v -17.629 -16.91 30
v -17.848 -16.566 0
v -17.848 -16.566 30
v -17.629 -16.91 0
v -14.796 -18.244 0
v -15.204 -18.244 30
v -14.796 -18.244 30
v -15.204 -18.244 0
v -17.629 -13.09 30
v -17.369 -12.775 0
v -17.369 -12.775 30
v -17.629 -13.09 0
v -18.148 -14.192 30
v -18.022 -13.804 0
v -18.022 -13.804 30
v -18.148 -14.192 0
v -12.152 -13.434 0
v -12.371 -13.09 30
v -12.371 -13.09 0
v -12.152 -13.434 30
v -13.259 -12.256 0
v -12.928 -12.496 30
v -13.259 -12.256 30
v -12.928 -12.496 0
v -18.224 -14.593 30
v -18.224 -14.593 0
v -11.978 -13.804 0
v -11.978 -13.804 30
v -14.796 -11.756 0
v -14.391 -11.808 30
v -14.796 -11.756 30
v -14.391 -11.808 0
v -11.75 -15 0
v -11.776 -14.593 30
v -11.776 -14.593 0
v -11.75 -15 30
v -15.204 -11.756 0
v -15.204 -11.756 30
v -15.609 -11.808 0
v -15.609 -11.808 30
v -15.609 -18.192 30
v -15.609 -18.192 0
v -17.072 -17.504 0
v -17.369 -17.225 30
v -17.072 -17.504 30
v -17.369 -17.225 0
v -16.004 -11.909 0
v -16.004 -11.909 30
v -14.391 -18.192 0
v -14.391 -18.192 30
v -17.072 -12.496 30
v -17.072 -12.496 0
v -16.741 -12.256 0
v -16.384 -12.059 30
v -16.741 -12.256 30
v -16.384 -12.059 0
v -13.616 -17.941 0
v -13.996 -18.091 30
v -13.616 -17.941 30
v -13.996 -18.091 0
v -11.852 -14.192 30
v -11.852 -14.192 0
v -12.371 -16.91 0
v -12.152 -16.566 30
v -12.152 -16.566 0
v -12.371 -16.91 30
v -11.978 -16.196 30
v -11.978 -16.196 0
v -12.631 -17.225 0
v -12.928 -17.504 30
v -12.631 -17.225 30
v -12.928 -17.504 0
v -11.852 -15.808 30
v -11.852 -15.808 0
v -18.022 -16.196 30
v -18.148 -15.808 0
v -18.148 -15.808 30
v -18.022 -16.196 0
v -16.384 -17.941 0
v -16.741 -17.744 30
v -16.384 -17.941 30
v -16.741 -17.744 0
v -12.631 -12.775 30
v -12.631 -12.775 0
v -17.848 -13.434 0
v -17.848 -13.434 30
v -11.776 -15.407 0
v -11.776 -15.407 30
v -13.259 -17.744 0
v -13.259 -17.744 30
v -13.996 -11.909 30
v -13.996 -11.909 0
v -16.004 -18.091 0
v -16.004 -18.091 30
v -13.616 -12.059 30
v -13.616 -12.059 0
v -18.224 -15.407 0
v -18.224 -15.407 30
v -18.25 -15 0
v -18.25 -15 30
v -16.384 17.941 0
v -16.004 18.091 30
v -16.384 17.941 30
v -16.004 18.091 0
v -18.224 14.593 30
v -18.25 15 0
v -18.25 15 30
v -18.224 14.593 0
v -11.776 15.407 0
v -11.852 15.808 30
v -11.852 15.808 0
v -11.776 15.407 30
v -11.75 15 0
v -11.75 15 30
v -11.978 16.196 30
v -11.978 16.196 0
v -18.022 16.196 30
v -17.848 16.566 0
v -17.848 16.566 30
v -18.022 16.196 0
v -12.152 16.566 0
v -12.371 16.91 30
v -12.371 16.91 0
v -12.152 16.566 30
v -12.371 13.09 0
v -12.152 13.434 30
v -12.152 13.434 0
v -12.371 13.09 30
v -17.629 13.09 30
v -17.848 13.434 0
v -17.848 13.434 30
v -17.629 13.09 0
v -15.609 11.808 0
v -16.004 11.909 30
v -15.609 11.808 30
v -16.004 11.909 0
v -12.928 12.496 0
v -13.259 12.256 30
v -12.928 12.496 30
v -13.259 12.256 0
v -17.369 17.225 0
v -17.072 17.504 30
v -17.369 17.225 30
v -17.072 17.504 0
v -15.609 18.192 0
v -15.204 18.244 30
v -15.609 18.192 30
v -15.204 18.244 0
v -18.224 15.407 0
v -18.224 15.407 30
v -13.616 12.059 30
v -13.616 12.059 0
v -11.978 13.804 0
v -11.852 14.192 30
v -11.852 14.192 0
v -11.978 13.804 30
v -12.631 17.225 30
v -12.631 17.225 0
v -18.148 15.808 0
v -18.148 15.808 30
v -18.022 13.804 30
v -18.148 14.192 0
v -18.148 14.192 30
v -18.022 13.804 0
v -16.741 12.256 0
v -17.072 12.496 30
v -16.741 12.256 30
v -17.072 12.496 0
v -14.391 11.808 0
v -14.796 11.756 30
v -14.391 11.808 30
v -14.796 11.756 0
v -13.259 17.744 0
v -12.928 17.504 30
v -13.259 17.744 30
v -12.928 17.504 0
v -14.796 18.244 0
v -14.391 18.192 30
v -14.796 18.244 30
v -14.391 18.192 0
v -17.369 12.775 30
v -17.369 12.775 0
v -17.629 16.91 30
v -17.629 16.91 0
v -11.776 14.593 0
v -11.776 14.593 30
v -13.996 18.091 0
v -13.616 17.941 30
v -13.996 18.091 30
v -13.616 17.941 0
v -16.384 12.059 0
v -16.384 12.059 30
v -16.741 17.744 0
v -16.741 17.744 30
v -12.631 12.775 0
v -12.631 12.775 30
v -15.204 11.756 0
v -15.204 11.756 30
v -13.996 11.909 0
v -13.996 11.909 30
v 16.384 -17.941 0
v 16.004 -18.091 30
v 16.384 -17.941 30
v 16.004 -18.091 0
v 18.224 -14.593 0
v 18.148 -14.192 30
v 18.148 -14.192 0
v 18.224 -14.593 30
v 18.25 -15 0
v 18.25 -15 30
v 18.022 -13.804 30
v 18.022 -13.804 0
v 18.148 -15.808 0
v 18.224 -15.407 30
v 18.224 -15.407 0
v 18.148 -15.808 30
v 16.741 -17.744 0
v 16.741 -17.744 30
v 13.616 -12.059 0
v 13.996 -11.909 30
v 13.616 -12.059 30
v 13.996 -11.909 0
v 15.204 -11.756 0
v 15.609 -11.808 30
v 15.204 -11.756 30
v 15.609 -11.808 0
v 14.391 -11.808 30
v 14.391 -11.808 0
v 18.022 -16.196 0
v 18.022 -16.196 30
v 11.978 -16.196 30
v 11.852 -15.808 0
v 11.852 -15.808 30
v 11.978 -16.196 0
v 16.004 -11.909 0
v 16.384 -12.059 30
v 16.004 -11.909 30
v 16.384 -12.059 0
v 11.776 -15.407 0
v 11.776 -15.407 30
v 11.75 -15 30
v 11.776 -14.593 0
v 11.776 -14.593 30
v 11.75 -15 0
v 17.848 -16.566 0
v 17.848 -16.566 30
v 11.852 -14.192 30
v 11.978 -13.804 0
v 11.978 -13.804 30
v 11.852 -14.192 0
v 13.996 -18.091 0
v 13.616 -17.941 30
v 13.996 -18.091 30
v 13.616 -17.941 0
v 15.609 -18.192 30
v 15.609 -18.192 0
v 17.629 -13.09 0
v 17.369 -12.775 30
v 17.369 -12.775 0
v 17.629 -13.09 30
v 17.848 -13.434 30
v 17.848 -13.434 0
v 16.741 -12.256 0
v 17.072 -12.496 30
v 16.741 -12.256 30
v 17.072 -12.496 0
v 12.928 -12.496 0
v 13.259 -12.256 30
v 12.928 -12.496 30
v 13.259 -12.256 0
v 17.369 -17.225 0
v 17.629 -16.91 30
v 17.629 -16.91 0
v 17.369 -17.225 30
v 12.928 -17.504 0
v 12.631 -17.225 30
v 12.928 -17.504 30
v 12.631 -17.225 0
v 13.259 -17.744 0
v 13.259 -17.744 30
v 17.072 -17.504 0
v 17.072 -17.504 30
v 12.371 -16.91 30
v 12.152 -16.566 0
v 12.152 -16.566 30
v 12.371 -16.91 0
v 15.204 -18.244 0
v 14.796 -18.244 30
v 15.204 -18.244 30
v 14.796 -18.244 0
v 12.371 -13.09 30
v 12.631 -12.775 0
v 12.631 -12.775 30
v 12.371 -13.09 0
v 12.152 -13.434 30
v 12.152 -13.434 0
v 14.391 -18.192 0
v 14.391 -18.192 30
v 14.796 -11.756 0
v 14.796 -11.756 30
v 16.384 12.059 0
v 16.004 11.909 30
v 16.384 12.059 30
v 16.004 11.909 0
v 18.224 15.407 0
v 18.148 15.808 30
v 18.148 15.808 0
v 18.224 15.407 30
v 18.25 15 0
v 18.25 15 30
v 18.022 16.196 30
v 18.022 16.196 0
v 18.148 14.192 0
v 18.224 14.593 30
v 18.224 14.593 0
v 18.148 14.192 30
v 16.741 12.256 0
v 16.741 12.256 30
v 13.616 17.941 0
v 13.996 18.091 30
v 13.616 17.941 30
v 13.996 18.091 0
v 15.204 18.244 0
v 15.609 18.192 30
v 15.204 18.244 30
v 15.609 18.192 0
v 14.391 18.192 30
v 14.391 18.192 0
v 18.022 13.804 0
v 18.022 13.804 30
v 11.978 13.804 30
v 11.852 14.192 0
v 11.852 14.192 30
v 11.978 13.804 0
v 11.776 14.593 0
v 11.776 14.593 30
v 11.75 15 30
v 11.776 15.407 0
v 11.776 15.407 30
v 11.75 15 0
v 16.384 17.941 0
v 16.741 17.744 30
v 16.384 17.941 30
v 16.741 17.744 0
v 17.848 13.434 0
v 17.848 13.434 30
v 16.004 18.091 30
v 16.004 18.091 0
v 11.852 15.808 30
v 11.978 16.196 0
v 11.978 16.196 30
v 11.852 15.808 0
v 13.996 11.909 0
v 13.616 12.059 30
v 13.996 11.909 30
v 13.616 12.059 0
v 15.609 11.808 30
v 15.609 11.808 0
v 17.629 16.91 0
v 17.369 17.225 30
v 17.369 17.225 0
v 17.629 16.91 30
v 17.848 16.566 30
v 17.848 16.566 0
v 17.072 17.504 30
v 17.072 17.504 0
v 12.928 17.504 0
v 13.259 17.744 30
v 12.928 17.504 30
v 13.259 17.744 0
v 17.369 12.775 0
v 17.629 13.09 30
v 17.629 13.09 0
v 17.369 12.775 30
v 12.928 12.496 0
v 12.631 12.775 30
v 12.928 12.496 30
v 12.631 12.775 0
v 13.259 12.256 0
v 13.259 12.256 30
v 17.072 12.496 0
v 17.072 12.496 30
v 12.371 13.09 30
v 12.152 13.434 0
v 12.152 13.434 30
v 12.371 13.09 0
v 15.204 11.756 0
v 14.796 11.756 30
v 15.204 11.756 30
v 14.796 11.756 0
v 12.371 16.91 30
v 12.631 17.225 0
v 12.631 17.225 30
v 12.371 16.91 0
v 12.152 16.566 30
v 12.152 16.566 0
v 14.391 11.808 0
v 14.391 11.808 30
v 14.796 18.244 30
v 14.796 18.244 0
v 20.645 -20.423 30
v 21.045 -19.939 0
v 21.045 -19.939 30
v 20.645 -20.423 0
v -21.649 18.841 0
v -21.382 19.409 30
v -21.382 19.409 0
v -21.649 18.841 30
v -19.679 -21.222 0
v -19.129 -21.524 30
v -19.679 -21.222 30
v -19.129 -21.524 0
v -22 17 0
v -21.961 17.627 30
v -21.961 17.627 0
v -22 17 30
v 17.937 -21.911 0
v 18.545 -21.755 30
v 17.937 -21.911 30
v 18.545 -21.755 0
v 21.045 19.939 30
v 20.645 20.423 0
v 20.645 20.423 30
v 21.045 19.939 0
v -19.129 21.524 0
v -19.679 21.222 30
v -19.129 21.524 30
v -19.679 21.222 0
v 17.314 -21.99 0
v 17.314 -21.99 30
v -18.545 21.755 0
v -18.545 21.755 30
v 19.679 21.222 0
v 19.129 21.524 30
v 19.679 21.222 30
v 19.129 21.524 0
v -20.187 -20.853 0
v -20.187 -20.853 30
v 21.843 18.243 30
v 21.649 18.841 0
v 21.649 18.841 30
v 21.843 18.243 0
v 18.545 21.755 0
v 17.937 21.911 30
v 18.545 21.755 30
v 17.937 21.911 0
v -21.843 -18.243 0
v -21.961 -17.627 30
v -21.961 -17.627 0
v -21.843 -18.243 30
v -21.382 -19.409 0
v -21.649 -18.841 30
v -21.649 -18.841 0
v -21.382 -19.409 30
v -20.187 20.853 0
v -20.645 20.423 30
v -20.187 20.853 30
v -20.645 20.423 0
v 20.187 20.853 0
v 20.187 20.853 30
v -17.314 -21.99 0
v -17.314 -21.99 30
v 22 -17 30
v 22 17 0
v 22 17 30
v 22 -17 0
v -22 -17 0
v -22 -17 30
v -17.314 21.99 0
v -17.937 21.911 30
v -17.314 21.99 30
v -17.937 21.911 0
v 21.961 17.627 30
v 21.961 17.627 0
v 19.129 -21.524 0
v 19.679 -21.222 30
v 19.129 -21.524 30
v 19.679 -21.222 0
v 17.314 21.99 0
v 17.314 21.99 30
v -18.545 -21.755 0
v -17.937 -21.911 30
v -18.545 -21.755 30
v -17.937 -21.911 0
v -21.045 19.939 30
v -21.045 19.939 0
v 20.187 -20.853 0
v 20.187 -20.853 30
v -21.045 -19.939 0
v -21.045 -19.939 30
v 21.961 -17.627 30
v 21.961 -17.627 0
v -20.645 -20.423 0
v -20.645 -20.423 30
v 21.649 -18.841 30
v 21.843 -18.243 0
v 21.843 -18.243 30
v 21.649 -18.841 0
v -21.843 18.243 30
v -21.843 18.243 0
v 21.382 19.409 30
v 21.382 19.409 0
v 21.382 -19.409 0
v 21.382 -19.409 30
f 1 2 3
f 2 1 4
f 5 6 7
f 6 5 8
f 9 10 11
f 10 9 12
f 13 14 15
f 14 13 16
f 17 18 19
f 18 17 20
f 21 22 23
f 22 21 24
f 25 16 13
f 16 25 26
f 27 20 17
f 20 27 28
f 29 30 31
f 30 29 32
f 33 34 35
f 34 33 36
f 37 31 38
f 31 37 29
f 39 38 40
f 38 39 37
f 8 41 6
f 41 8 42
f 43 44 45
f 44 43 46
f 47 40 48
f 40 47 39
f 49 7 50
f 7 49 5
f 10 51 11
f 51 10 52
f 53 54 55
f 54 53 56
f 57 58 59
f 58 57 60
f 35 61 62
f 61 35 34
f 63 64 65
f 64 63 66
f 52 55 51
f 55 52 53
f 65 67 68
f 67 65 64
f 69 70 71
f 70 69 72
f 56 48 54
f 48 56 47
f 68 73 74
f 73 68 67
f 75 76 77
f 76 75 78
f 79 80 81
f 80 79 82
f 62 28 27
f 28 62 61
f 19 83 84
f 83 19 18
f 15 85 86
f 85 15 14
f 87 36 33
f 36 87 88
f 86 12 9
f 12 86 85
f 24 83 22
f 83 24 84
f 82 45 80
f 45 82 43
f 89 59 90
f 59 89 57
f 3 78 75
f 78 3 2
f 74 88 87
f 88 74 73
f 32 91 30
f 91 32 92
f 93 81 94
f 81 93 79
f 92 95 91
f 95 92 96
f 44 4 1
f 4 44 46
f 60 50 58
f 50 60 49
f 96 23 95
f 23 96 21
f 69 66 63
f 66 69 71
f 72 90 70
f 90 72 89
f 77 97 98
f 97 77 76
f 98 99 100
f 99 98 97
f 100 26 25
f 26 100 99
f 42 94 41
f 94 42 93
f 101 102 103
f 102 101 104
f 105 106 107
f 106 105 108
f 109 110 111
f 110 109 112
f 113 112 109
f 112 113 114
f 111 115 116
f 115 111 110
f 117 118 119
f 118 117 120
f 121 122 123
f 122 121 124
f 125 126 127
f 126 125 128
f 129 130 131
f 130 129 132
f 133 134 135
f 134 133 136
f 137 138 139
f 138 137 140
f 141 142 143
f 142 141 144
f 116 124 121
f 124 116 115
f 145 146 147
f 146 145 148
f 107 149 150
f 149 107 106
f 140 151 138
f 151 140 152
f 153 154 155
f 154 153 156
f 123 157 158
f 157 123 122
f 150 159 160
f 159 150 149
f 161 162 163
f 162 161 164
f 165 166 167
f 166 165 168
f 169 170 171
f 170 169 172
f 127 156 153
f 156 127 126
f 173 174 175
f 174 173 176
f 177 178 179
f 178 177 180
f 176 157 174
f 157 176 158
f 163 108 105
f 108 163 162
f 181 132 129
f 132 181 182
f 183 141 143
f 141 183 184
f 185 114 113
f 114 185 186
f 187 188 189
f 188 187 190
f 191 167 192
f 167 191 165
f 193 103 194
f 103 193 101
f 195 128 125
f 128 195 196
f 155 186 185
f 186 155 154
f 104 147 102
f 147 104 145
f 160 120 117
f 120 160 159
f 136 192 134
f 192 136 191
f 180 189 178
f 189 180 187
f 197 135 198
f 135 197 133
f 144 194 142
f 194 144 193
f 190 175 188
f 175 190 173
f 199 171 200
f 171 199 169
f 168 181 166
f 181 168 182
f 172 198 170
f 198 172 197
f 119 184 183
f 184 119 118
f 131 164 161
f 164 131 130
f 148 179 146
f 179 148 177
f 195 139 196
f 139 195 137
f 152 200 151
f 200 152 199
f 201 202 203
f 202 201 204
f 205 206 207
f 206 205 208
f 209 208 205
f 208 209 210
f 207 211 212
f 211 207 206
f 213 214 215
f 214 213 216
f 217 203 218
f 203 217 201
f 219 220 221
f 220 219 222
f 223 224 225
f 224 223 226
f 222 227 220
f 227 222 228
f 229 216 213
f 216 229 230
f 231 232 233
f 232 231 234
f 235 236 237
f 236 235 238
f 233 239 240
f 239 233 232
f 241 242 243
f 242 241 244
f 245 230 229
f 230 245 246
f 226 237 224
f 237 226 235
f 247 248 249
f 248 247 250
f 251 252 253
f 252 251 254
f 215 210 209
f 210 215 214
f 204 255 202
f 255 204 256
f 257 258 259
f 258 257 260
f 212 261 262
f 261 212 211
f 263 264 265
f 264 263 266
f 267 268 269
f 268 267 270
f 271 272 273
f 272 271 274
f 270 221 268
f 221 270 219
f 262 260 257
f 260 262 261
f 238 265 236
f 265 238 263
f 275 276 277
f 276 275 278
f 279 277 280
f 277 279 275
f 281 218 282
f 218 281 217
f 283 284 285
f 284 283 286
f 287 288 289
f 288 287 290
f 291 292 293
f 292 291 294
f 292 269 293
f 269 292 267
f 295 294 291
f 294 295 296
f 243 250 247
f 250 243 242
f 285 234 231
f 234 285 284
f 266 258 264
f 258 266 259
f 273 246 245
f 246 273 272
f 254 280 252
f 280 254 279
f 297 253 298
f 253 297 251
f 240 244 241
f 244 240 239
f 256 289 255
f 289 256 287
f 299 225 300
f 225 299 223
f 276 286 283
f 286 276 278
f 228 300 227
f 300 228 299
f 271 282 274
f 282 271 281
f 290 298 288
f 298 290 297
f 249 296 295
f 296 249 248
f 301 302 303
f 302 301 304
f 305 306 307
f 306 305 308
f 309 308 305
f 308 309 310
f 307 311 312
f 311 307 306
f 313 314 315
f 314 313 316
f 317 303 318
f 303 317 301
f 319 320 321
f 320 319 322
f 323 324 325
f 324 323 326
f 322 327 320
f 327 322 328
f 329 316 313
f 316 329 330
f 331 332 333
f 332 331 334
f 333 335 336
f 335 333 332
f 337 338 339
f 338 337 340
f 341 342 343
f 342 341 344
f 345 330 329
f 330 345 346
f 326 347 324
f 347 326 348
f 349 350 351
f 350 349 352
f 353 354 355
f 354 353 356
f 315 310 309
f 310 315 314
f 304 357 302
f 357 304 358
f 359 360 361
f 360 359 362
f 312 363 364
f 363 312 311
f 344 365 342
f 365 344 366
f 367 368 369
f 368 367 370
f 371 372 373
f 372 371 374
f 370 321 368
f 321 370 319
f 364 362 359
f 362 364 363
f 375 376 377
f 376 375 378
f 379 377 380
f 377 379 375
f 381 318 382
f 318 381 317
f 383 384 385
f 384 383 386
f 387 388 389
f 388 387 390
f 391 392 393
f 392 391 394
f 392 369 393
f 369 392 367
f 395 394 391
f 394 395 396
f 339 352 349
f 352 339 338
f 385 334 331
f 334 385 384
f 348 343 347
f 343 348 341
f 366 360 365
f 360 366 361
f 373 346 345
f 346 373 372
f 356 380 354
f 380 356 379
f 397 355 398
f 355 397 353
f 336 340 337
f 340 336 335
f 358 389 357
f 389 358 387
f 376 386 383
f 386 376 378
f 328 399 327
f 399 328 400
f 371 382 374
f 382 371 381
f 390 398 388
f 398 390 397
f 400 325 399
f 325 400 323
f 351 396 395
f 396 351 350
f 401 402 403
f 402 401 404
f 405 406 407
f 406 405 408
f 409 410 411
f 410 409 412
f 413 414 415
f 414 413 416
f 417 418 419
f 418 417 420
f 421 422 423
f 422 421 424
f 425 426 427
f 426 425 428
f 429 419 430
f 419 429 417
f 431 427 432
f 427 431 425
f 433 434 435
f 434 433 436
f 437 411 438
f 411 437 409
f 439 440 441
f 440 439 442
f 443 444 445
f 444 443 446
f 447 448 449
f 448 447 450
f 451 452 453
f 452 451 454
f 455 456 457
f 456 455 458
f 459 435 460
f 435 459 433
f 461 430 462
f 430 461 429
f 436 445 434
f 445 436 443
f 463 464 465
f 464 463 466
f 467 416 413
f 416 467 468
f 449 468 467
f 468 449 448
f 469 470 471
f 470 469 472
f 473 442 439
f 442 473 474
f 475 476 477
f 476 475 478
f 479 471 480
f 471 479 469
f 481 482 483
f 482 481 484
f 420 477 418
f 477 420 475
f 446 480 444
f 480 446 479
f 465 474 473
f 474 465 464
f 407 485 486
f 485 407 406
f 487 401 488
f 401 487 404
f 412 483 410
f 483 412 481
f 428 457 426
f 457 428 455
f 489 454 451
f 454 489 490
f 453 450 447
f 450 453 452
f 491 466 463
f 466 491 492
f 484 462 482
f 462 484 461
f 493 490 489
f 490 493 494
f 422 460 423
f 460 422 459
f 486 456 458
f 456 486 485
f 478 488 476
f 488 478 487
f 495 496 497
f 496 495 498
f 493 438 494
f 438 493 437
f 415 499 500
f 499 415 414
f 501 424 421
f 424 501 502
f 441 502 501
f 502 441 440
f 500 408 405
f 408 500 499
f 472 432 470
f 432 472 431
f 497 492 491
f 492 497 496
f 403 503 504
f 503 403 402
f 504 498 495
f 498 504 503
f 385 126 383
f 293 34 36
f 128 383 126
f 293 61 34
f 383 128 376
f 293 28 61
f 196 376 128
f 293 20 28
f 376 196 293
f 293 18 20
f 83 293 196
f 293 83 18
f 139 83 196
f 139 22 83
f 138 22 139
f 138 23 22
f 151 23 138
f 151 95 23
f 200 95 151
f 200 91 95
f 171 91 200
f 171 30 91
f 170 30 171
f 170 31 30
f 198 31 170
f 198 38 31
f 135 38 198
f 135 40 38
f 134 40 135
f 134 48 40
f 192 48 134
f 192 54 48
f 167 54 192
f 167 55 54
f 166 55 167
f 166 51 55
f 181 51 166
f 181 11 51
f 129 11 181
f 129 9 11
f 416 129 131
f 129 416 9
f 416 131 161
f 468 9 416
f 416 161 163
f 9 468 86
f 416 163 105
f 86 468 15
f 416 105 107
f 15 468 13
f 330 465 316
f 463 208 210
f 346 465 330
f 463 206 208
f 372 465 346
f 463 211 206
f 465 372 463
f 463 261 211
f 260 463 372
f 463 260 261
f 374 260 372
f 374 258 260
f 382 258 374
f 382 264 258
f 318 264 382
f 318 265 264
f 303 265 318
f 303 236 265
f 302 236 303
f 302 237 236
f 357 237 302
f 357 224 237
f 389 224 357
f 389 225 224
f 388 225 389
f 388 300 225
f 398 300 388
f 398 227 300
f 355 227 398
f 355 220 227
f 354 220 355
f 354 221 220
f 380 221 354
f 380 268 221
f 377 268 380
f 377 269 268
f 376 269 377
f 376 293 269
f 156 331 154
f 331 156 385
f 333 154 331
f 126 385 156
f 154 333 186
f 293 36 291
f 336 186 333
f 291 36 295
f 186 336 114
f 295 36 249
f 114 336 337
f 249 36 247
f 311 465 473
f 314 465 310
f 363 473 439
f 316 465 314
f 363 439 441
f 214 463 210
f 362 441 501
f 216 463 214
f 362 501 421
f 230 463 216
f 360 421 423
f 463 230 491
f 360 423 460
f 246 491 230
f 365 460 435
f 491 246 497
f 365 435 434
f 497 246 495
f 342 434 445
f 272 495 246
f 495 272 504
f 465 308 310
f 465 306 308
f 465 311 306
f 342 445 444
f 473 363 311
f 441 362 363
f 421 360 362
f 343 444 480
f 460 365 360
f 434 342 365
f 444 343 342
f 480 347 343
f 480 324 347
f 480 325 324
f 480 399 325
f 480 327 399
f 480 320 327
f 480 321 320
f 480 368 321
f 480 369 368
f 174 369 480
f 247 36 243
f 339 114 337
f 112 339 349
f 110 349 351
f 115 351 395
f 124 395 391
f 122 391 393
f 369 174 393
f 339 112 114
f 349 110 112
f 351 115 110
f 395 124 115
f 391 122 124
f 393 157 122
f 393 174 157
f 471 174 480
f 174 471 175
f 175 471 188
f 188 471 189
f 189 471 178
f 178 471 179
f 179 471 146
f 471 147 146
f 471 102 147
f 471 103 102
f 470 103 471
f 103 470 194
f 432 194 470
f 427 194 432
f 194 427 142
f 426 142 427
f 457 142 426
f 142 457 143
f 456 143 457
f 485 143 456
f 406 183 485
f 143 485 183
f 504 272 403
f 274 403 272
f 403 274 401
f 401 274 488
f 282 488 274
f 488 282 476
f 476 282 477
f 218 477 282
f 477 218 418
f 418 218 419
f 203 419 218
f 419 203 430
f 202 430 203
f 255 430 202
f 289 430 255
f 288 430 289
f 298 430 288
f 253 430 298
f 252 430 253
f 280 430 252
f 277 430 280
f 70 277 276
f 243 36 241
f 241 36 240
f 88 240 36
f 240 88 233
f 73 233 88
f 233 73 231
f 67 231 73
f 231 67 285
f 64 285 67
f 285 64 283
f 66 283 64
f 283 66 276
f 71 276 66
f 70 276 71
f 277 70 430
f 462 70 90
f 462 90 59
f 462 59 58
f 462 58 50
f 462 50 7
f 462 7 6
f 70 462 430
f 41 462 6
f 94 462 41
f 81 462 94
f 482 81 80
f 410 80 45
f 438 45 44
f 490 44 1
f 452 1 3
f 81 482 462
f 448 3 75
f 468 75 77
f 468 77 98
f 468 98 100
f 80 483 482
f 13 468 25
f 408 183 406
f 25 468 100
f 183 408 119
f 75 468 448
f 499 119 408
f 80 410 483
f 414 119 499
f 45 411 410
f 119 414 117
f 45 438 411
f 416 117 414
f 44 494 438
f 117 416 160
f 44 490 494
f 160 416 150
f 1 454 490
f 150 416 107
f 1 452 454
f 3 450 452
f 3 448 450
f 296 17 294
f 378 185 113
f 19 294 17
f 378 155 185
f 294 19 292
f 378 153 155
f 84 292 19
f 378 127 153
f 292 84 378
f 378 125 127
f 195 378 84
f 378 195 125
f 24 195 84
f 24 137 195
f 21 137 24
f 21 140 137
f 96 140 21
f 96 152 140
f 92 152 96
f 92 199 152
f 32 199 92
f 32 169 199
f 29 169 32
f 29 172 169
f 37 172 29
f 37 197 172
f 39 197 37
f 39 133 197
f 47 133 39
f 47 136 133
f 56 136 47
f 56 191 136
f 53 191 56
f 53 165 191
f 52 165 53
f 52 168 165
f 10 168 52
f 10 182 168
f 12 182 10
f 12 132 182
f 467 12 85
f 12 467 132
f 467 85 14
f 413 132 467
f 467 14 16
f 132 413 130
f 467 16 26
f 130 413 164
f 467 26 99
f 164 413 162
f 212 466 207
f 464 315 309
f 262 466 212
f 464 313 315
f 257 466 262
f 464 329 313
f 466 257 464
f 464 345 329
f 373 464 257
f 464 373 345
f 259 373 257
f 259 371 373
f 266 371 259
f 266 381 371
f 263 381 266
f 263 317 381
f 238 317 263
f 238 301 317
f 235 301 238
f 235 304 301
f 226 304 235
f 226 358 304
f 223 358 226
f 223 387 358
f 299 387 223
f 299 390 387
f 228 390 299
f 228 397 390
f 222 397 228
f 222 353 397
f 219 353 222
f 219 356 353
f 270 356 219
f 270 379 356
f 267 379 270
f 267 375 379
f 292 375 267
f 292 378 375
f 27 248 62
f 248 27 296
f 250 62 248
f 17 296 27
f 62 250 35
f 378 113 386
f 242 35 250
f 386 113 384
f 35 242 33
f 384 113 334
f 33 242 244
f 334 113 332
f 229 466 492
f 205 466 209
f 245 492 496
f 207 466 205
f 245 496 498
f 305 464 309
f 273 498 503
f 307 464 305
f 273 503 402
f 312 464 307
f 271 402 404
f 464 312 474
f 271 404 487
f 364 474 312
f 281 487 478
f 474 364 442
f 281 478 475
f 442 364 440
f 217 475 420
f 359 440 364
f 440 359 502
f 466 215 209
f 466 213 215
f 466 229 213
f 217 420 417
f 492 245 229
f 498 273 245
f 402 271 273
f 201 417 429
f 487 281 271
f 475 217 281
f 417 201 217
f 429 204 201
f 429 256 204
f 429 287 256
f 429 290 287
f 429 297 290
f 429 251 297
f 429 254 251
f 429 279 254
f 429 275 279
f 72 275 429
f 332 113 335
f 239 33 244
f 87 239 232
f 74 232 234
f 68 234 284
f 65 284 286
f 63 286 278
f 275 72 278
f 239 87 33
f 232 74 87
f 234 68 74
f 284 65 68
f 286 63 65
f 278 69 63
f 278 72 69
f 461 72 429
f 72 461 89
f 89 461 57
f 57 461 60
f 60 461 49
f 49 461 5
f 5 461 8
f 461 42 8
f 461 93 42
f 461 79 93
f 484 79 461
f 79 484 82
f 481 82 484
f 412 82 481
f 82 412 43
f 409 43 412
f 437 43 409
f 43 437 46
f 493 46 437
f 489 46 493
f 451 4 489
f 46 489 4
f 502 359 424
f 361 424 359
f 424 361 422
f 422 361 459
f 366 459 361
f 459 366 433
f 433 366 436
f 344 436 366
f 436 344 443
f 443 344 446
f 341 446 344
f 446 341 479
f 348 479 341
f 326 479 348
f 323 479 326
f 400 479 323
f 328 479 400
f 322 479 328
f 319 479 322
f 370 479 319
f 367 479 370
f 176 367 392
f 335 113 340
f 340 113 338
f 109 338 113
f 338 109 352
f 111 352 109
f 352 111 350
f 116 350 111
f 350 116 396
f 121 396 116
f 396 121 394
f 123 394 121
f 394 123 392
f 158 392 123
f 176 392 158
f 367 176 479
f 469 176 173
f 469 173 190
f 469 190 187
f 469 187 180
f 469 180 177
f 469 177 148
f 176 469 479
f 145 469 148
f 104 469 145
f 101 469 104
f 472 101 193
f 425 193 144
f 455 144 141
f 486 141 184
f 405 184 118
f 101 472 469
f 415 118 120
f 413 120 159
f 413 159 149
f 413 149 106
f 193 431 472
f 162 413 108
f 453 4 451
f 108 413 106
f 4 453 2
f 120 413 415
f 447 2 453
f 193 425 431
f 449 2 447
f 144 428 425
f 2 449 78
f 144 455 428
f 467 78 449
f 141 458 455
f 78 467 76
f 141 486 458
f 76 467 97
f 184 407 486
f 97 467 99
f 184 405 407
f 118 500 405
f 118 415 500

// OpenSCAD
$fn = 50;


difference() {
	union() {
		hull() {
			translate(v = [-17.0000000000, 17.0000000000, 0]) {
				cylinder(h = 30, r = 5);
			}
			translate(v = [17.0000000000, 17.0000000000, 0]) {
				cylinder(h = 30, r = 5);
			}
			translate(v = [-17.0000000000, -17.0000000000, 0]) {
				cylinder(h = 30, r = 5);
			}
			translate(v = [17.0000000000, -17.0000000000, 0]) {
				cylinder(h = 30, r = 5);
			}
		}
	}
	union() {
		translate(v = [-15.0000000000, -15.0000000000, -100.0000000000]) {
			cylinder(h = 200, r = 3.2500000000);
		}
		translate(v = [-15.0000000000, 15.0000000000, -100.0000000000]) {
			cylinder(h = 200, r = 3.2500000000);
		}
		translate(v = [15.0000000000, -15.0000000000, -100.0000000000]) {
			cylinder(h = 200, r = 3.2500000000);
		}
		translate(v = [15.0000000000, 15.0000000000, -100.0000000000]) {
			cylinder(h = 200, r = 3.2500000000);
		}
	}
}
